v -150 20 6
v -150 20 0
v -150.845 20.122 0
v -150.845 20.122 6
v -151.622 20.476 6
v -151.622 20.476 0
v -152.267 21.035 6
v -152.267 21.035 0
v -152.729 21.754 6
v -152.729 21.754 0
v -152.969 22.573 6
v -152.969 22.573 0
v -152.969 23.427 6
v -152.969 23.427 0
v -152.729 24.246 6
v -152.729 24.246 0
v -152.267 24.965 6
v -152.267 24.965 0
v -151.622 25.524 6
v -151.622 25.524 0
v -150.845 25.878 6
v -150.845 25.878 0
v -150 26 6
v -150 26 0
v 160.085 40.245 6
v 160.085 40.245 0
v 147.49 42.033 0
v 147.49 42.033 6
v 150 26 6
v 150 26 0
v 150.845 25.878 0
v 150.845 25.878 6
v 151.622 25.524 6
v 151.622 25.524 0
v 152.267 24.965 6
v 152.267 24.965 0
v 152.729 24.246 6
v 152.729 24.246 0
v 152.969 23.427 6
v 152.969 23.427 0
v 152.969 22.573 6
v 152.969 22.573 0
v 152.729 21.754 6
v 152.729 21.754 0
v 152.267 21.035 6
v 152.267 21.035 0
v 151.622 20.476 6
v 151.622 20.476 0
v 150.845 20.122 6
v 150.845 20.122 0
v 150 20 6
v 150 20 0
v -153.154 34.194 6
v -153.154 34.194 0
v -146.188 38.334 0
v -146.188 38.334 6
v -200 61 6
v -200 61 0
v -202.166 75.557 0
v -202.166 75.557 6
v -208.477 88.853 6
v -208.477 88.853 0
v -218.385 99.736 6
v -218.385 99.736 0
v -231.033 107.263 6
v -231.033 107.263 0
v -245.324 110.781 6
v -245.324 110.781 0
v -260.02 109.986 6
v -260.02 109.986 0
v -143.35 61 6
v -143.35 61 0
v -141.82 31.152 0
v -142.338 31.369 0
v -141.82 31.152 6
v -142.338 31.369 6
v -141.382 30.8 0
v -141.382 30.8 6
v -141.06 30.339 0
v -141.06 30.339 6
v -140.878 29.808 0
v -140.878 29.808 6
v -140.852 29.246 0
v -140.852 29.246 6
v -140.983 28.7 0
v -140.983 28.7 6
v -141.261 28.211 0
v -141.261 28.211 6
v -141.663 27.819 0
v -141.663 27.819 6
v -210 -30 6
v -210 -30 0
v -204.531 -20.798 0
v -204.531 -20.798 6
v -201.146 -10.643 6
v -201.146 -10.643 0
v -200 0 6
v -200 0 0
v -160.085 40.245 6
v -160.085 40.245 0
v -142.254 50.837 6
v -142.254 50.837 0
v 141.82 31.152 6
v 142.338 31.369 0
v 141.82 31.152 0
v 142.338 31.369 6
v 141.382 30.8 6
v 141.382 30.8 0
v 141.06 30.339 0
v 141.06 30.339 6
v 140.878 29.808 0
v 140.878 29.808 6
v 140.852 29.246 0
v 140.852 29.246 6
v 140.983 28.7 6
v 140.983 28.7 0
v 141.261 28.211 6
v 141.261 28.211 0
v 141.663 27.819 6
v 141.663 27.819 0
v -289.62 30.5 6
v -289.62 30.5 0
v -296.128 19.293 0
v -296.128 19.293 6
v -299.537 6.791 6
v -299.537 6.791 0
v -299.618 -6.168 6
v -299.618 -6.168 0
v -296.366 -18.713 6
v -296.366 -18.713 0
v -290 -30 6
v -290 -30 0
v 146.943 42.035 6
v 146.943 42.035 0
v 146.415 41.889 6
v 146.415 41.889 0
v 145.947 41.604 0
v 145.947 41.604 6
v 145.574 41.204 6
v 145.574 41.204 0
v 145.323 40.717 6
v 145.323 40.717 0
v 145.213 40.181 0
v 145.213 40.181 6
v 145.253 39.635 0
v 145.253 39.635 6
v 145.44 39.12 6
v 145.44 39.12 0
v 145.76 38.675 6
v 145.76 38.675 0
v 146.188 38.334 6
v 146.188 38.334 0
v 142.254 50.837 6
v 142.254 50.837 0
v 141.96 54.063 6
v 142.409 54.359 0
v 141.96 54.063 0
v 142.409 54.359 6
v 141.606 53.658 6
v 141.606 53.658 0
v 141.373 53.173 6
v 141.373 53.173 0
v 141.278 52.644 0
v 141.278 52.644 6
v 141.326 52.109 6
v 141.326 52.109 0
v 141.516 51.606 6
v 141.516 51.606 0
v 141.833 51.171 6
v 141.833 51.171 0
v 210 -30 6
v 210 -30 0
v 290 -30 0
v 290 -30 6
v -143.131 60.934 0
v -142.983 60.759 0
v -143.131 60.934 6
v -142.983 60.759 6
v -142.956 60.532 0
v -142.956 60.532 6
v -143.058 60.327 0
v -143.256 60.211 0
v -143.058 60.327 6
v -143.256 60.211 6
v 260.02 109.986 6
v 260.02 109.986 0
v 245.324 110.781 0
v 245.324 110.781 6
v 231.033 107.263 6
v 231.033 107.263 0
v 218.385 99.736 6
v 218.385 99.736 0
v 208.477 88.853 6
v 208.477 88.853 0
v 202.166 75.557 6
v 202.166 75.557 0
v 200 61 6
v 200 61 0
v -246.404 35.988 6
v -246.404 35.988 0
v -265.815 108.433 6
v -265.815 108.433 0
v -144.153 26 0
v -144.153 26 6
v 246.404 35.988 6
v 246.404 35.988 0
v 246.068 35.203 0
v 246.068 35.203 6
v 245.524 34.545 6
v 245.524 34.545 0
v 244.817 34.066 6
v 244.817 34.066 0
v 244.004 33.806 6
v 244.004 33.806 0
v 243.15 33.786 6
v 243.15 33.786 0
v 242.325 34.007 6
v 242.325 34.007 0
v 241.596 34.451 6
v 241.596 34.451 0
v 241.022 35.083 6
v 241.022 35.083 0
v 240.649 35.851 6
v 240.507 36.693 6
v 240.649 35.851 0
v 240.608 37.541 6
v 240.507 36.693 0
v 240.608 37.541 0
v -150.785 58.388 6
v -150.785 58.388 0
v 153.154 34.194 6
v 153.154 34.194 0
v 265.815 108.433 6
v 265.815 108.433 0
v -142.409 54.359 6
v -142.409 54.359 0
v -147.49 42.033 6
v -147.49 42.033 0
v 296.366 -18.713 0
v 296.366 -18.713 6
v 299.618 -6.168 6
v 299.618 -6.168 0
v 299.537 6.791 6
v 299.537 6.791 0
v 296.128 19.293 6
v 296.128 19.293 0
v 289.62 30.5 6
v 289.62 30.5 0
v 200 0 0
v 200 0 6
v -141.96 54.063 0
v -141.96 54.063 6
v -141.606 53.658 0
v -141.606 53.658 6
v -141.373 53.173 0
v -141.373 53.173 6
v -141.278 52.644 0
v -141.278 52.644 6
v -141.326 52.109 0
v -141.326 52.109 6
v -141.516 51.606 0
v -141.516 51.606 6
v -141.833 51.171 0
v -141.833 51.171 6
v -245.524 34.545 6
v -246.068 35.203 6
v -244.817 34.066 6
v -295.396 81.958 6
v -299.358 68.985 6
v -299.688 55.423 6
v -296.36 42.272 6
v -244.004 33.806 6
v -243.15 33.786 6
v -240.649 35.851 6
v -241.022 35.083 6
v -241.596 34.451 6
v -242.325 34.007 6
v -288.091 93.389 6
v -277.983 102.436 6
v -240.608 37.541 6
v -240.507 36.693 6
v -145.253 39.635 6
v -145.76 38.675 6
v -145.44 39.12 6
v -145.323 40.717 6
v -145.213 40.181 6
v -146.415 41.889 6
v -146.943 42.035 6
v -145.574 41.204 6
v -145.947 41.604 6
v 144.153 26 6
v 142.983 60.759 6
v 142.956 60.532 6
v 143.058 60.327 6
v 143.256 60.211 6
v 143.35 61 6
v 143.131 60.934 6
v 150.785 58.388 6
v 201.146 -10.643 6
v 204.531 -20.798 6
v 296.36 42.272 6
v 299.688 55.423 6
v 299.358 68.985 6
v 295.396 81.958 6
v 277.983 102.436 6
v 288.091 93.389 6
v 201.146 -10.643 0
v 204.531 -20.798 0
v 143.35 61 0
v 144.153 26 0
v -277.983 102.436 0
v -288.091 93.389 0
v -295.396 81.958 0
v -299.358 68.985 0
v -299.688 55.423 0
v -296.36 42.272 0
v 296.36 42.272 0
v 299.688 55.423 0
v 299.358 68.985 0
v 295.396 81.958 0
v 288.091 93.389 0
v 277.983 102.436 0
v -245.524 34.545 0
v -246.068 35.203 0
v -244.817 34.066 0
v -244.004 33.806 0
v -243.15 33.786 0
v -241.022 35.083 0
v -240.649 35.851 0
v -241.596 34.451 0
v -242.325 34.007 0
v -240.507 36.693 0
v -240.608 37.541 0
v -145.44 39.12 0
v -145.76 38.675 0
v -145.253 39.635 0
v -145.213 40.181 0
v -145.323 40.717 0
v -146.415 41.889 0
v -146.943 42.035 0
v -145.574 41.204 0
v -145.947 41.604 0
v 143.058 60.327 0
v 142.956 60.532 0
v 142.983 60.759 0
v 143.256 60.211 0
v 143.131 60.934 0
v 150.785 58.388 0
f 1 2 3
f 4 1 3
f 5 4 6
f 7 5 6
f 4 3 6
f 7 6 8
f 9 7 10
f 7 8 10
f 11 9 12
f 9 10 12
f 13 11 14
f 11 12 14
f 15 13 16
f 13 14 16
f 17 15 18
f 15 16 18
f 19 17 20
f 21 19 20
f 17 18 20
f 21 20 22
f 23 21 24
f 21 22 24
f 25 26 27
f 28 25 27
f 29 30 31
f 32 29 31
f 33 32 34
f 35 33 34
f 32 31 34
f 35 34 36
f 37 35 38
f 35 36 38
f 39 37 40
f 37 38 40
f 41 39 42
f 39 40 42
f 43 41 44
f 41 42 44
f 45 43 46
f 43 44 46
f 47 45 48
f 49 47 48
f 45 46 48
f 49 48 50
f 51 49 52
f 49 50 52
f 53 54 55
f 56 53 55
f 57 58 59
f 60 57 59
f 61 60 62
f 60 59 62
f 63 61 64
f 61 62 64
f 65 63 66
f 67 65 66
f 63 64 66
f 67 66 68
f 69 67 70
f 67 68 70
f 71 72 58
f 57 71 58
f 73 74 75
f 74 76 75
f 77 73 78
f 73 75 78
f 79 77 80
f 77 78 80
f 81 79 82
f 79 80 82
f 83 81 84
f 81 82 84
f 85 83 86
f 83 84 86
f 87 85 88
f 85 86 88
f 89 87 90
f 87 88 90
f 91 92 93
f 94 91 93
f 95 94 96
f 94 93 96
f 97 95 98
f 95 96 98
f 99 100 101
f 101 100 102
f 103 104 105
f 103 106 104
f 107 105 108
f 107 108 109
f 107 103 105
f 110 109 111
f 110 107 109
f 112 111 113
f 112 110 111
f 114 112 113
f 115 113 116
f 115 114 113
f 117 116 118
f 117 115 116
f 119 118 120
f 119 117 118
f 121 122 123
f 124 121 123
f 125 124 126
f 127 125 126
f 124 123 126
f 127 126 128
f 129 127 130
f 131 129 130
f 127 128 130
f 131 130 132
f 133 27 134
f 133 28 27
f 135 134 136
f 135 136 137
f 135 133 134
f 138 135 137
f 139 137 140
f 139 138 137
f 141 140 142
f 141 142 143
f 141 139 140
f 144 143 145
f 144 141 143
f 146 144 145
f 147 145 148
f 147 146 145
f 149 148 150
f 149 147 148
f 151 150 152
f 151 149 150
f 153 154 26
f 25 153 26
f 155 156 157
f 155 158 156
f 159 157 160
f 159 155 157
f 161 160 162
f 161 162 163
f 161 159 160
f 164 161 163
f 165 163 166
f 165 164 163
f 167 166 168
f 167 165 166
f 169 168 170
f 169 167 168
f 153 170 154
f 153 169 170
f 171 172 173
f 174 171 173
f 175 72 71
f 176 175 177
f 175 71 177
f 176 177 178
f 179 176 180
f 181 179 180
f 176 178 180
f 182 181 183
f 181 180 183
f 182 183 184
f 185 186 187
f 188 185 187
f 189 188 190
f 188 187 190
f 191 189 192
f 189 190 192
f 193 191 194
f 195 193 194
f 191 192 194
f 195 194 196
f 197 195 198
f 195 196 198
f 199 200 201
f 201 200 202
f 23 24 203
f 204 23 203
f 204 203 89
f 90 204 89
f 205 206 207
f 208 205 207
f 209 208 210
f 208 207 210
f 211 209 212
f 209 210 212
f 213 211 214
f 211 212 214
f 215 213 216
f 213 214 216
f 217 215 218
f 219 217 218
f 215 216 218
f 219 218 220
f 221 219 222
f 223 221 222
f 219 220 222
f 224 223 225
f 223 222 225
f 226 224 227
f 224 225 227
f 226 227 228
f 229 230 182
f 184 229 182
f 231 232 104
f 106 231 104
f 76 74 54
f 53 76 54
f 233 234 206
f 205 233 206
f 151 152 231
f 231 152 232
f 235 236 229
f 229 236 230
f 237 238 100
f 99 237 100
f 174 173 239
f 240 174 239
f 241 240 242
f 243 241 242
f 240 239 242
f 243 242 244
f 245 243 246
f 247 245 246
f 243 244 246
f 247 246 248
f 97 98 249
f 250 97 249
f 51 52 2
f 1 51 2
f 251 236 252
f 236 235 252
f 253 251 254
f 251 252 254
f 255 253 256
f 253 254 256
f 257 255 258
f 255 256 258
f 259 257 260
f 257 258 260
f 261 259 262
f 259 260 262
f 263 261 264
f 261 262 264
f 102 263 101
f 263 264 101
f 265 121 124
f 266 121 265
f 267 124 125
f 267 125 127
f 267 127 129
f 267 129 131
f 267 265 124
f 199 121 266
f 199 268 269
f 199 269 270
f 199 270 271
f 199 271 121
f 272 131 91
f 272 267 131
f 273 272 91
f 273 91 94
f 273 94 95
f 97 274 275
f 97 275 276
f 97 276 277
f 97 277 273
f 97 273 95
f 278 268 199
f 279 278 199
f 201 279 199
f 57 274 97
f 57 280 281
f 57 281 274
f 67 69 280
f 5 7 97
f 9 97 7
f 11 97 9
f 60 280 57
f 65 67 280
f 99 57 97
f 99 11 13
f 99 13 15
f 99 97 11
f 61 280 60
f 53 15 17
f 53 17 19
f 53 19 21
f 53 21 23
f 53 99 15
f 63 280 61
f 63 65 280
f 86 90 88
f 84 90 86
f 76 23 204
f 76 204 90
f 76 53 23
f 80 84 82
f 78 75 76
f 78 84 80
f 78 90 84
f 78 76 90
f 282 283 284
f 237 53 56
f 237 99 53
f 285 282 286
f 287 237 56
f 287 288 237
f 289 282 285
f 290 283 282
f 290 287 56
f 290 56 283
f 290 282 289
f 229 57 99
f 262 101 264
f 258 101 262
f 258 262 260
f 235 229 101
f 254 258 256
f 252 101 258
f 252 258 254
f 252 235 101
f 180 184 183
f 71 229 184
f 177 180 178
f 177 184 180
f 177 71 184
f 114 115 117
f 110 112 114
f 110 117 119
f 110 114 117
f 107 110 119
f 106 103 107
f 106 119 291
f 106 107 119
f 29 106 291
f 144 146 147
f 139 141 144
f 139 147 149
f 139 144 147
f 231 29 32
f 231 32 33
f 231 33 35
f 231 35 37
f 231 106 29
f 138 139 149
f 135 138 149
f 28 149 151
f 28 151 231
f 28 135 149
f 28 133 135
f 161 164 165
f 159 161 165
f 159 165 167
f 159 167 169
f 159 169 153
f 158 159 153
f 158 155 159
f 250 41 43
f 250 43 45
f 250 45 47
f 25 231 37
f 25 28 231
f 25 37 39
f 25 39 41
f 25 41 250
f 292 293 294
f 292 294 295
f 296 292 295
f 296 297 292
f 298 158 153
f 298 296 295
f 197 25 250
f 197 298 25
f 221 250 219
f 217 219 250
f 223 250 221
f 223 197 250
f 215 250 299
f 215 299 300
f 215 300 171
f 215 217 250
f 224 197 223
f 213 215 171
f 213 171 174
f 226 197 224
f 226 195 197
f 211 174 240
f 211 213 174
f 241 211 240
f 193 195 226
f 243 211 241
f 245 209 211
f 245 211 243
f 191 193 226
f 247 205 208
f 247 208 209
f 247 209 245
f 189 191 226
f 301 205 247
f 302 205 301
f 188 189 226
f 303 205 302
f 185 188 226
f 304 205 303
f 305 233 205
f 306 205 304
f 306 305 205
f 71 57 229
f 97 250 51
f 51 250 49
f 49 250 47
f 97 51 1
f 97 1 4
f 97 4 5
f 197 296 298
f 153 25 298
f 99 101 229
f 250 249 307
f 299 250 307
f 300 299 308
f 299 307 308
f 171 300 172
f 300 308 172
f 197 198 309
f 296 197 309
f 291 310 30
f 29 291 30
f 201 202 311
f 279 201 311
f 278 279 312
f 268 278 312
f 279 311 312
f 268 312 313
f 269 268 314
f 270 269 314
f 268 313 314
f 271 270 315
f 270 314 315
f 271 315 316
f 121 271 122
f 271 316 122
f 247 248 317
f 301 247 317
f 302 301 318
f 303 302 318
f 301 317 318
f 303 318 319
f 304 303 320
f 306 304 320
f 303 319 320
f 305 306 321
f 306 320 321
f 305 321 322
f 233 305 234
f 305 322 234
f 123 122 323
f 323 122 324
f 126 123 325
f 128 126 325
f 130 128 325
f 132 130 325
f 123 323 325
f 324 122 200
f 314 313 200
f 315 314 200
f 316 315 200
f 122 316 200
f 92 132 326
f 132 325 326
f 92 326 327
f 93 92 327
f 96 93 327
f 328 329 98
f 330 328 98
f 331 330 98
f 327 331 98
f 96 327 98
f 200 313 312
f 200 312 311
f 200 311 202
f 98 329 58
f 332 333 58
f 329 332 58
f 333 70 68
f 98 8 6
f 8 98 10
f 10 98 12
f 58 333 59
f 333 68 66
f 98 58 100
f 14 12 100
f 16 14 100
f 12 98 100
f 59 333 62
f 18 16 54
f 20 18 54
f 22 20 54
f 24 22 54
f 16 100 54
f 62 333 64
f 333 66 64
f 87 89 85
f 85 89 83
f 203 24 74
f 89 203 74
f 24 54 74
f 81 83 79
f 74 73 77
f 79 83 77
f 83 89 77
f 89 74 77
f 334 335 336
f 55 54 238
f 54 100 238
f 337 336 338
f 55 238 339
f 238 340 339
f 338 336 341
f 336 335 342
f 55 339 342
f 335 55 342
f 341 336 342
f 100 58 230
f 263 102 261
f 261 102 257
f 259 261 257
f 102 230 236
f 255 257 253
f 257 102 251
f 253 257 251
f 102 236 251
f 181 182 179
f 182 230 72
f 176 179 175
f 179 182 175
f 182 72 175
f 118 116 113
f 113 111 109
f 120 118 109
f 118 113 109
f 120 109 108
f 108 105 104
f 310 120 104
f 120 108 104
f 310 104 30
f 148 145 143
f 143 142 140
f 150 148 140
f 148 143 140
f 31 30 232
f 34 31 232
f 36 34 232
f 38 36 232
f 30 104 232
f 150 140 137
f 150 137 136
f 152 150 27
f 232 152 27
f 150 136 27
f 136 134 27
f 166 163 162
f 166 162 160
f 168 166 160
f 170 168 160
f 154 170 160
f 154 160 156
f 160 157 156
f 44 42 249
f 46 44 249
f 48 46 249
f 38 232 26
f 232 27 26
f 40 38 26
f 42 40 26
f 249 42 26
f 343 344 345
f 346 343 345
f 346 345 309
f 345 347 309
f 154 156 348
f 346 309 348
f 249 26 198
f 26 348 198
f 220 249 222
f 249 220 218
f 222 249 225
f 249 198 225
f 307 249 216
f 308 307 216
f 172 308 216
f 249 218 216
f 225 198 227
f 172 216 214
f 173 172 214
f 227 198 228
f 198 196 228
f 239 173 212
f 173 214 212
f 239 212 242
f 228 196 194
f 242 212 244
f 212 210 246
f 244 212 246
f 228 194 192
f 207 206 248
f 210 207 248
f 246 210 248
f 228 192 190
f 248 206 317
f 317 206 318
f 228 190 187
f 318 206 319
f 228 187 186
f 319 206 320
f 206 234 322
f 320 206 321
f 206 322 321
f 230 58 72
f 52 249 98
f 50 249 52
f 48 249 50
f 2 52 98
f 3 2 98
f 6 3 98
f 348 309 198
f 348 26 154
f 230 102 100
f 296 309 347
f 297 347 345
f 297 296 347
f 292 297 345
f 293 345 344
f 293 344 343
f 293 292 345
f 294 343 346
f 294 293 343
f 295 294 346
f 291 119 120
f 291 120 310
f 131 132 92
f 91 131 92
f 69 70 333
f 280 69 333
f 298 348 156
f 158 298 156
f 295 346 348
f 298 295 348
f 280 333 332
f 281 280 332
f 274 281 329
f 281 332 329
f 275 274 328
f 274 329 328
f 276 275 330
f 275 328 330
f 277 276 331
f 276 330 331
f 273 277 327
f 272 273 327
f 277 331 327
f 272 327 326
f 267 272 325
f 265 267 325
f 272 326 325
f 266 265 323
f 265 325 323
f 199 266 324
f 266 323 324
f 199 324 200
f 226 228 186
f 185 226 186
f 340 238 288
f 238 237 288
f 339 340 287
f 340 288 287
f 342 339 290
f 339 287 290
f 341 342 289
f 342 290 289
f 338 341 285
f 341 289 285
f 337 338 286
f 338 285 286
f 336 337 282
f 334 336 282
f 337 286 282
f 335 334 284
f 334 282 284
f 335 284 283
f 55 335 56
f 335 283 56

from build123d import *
from OCP.BRepFilletAPI import BRepFilletAPI_MakeFillet

# Parameters (mm, degrees)
RESSALTO_EXTRUS_O2_DEPTH = 6
FILETE2_R1               = 2
FILETE2_R2               = 0.4
FILETE3_R                = 0.4
FILETE4_R                = 2


with BuildPart() as part:
    # Esbo_o1 → Ressalto-extrus_o2 (new body)
    with BuildSketch(Plane.XY):
        with BuildLine():
            Line((-199.999999999, 0), (199.999999999, 0))
            ThreePointArc((199.999999999, 0), (202.565835097, -15.811388301), (209.999999999, -30))
            Line((209.999999999, -30), (289.999999999, -30))
            ThreePointArc((289.999999999, -30), (299.999014124, 0.31398499), (289.62007067, 30.5))
            ThreePointArc((289.62007067, 30.5), (297.818976076, 75.60635228), (265.815415017, 108.432822474))
            Line((265.815415017, 108.432822474), (246.403986634, 35.988385502))
            ThreePointArc((246.403986634, 35.988385502), (242.72975202, 33.867065158), (240.608431676, 37.541299773))
            Line((240.608431676, 37.541299773), (260.019860059, 109.985736744))
            ThreePointArc((260.019860059, 109.985736744), (218.38507475, 99.736242739), (199.999999999, 61))
            Line((199.999999999, 61), (140, 61))
            Line((140, 61), (150.784643454, 58.387579086))
            Line((150.784643454, 58.387579086), (139.047219324, 52.742194858))
            Line((139.047219324, 52.742194858), (160.085396074, 40.245061921))
            Line((160.085396074, 40.245061921), (137.597498913, 43.437533109))
            Line((137.597498913, 43.437533109), (153.154101004, 34.194272541))
            Line((153.154101004, 34.194272541), (138.26257587, 30.30469508))
            Line((138.26257587, 30.30469508), (144.152507453, 26))
            Line((144.152507453, 26), (149.999999999, 26))
            ThreePointArc((149.999999999, 26), (152.999999999, 23), (149.999999999, 20))
            Line((149.999999999, 20), (-149.999999999, 20))
            ThreePointArc((-149.999999999, 20), (-152.999999999, 23), (-149.999999999, 26))
            Line((-149.999999999, 26), (-144.152507453, 26))
            Line((-144.152507453, 26), (-138.26257587, 30.30469508))
            Line((-138.26257587, 30.30469508), (-153.154101004, 34.194272541))
            Line((-153.154101004, 34.194272541), (-137.597498913, 43.437533109))
            Line((-137.597498913, 43.437533109), (-160.085396074, 40.245061921))
            Line((-160.085396074, 40.245061921), (-139.047219324, 52.742194858))
            Line((-139.047219324, 52.742194858), (-150.784643454, 58.387579086))
            Line((-150.784643454, 58.387579086), (-140, 61))
            Line((-140, 61), (-199.999999999, 61))
            ThreePointArc((-199.999999999, 61), (-218.38507475, 99.736242739), (-260.019860059, 109.985736744))
            Line((-260.019860059, 109.985736744), (-240.608431676, 37.541299773))
            ThreePointArc((-240.608431676, 37.541299773), (-242.72975202, 33.867065158), (-246.403986634, 35.988385502))
            Line((-246.403986634, 35.988385502), (-265.815415017, 108.432822474))
            ThreePointArc((-265.815415017, 108.432822474), (-297.818976076, 75.60635228), (-289.62007067, 30.5))
            ThreePointArc((-289.62007067, 30.5), (-299.999014124, 0.31398499), (-289.999999999, -30))
            Line((-289.999999999, -30), (-209.999999999, -30))
            ThreePointArc((-209.999999999, -30), (-202.565835097, -15.811388301), (-199.999999999, 0))
        make_face()
    extrude(amount=RESSALTO_EXTRUS_O2_DEPTH)

    # Filete2: one fillet with a radius per group of edges: ONE call of the kernel's fillet builder (fillet() takes one radius for all edges)
    filete2_edges_1 = [part.edges().sort_by_distance(p)[0] for p in [
        (139.047219324, 52.742194858, 3),
        (137.597498913, 43.437533109, 3),
        (138.26257587, 30.30469508, 3),
    ]]
    filete2_edges_2 = [part.edges().sort_by_distance(p)[0] for p in [
        (140, 61, 3),
    ]]
    filete2 = BRepFilletAPI_MakeFillet(part.part.solid().wrapped)
    for e in filete2_edges_1:
        filete2.Add(FILETE2_R1, e.wrapped)
    for e in filete2_edges_2:
        filete2.Add(FILETE2_R2, e.wrapped)
    add(Compound.cast(filete2.Shape()), mode=Mode.REPLACE)

    # Filete3
    filete3_edges = [part.edges().sort_by_distance(p)[0] for p in [
        (-140, 61, 3),
    ]]
    fillet(filete3_edges, radius=FILETE3_R)

    # Filete4
    filete4_edges = [part.edges().sort_by_distance(p)[0] for p in [
        (-139.047219324, 52.742194858, 3),
        (-137.597498913, 43.437533109, 3),
        (-138.26257587, 30.30469508, 3),
    ]]
    fillet(filete4_edges, radius=FILETE4_R)


solid = part.part
